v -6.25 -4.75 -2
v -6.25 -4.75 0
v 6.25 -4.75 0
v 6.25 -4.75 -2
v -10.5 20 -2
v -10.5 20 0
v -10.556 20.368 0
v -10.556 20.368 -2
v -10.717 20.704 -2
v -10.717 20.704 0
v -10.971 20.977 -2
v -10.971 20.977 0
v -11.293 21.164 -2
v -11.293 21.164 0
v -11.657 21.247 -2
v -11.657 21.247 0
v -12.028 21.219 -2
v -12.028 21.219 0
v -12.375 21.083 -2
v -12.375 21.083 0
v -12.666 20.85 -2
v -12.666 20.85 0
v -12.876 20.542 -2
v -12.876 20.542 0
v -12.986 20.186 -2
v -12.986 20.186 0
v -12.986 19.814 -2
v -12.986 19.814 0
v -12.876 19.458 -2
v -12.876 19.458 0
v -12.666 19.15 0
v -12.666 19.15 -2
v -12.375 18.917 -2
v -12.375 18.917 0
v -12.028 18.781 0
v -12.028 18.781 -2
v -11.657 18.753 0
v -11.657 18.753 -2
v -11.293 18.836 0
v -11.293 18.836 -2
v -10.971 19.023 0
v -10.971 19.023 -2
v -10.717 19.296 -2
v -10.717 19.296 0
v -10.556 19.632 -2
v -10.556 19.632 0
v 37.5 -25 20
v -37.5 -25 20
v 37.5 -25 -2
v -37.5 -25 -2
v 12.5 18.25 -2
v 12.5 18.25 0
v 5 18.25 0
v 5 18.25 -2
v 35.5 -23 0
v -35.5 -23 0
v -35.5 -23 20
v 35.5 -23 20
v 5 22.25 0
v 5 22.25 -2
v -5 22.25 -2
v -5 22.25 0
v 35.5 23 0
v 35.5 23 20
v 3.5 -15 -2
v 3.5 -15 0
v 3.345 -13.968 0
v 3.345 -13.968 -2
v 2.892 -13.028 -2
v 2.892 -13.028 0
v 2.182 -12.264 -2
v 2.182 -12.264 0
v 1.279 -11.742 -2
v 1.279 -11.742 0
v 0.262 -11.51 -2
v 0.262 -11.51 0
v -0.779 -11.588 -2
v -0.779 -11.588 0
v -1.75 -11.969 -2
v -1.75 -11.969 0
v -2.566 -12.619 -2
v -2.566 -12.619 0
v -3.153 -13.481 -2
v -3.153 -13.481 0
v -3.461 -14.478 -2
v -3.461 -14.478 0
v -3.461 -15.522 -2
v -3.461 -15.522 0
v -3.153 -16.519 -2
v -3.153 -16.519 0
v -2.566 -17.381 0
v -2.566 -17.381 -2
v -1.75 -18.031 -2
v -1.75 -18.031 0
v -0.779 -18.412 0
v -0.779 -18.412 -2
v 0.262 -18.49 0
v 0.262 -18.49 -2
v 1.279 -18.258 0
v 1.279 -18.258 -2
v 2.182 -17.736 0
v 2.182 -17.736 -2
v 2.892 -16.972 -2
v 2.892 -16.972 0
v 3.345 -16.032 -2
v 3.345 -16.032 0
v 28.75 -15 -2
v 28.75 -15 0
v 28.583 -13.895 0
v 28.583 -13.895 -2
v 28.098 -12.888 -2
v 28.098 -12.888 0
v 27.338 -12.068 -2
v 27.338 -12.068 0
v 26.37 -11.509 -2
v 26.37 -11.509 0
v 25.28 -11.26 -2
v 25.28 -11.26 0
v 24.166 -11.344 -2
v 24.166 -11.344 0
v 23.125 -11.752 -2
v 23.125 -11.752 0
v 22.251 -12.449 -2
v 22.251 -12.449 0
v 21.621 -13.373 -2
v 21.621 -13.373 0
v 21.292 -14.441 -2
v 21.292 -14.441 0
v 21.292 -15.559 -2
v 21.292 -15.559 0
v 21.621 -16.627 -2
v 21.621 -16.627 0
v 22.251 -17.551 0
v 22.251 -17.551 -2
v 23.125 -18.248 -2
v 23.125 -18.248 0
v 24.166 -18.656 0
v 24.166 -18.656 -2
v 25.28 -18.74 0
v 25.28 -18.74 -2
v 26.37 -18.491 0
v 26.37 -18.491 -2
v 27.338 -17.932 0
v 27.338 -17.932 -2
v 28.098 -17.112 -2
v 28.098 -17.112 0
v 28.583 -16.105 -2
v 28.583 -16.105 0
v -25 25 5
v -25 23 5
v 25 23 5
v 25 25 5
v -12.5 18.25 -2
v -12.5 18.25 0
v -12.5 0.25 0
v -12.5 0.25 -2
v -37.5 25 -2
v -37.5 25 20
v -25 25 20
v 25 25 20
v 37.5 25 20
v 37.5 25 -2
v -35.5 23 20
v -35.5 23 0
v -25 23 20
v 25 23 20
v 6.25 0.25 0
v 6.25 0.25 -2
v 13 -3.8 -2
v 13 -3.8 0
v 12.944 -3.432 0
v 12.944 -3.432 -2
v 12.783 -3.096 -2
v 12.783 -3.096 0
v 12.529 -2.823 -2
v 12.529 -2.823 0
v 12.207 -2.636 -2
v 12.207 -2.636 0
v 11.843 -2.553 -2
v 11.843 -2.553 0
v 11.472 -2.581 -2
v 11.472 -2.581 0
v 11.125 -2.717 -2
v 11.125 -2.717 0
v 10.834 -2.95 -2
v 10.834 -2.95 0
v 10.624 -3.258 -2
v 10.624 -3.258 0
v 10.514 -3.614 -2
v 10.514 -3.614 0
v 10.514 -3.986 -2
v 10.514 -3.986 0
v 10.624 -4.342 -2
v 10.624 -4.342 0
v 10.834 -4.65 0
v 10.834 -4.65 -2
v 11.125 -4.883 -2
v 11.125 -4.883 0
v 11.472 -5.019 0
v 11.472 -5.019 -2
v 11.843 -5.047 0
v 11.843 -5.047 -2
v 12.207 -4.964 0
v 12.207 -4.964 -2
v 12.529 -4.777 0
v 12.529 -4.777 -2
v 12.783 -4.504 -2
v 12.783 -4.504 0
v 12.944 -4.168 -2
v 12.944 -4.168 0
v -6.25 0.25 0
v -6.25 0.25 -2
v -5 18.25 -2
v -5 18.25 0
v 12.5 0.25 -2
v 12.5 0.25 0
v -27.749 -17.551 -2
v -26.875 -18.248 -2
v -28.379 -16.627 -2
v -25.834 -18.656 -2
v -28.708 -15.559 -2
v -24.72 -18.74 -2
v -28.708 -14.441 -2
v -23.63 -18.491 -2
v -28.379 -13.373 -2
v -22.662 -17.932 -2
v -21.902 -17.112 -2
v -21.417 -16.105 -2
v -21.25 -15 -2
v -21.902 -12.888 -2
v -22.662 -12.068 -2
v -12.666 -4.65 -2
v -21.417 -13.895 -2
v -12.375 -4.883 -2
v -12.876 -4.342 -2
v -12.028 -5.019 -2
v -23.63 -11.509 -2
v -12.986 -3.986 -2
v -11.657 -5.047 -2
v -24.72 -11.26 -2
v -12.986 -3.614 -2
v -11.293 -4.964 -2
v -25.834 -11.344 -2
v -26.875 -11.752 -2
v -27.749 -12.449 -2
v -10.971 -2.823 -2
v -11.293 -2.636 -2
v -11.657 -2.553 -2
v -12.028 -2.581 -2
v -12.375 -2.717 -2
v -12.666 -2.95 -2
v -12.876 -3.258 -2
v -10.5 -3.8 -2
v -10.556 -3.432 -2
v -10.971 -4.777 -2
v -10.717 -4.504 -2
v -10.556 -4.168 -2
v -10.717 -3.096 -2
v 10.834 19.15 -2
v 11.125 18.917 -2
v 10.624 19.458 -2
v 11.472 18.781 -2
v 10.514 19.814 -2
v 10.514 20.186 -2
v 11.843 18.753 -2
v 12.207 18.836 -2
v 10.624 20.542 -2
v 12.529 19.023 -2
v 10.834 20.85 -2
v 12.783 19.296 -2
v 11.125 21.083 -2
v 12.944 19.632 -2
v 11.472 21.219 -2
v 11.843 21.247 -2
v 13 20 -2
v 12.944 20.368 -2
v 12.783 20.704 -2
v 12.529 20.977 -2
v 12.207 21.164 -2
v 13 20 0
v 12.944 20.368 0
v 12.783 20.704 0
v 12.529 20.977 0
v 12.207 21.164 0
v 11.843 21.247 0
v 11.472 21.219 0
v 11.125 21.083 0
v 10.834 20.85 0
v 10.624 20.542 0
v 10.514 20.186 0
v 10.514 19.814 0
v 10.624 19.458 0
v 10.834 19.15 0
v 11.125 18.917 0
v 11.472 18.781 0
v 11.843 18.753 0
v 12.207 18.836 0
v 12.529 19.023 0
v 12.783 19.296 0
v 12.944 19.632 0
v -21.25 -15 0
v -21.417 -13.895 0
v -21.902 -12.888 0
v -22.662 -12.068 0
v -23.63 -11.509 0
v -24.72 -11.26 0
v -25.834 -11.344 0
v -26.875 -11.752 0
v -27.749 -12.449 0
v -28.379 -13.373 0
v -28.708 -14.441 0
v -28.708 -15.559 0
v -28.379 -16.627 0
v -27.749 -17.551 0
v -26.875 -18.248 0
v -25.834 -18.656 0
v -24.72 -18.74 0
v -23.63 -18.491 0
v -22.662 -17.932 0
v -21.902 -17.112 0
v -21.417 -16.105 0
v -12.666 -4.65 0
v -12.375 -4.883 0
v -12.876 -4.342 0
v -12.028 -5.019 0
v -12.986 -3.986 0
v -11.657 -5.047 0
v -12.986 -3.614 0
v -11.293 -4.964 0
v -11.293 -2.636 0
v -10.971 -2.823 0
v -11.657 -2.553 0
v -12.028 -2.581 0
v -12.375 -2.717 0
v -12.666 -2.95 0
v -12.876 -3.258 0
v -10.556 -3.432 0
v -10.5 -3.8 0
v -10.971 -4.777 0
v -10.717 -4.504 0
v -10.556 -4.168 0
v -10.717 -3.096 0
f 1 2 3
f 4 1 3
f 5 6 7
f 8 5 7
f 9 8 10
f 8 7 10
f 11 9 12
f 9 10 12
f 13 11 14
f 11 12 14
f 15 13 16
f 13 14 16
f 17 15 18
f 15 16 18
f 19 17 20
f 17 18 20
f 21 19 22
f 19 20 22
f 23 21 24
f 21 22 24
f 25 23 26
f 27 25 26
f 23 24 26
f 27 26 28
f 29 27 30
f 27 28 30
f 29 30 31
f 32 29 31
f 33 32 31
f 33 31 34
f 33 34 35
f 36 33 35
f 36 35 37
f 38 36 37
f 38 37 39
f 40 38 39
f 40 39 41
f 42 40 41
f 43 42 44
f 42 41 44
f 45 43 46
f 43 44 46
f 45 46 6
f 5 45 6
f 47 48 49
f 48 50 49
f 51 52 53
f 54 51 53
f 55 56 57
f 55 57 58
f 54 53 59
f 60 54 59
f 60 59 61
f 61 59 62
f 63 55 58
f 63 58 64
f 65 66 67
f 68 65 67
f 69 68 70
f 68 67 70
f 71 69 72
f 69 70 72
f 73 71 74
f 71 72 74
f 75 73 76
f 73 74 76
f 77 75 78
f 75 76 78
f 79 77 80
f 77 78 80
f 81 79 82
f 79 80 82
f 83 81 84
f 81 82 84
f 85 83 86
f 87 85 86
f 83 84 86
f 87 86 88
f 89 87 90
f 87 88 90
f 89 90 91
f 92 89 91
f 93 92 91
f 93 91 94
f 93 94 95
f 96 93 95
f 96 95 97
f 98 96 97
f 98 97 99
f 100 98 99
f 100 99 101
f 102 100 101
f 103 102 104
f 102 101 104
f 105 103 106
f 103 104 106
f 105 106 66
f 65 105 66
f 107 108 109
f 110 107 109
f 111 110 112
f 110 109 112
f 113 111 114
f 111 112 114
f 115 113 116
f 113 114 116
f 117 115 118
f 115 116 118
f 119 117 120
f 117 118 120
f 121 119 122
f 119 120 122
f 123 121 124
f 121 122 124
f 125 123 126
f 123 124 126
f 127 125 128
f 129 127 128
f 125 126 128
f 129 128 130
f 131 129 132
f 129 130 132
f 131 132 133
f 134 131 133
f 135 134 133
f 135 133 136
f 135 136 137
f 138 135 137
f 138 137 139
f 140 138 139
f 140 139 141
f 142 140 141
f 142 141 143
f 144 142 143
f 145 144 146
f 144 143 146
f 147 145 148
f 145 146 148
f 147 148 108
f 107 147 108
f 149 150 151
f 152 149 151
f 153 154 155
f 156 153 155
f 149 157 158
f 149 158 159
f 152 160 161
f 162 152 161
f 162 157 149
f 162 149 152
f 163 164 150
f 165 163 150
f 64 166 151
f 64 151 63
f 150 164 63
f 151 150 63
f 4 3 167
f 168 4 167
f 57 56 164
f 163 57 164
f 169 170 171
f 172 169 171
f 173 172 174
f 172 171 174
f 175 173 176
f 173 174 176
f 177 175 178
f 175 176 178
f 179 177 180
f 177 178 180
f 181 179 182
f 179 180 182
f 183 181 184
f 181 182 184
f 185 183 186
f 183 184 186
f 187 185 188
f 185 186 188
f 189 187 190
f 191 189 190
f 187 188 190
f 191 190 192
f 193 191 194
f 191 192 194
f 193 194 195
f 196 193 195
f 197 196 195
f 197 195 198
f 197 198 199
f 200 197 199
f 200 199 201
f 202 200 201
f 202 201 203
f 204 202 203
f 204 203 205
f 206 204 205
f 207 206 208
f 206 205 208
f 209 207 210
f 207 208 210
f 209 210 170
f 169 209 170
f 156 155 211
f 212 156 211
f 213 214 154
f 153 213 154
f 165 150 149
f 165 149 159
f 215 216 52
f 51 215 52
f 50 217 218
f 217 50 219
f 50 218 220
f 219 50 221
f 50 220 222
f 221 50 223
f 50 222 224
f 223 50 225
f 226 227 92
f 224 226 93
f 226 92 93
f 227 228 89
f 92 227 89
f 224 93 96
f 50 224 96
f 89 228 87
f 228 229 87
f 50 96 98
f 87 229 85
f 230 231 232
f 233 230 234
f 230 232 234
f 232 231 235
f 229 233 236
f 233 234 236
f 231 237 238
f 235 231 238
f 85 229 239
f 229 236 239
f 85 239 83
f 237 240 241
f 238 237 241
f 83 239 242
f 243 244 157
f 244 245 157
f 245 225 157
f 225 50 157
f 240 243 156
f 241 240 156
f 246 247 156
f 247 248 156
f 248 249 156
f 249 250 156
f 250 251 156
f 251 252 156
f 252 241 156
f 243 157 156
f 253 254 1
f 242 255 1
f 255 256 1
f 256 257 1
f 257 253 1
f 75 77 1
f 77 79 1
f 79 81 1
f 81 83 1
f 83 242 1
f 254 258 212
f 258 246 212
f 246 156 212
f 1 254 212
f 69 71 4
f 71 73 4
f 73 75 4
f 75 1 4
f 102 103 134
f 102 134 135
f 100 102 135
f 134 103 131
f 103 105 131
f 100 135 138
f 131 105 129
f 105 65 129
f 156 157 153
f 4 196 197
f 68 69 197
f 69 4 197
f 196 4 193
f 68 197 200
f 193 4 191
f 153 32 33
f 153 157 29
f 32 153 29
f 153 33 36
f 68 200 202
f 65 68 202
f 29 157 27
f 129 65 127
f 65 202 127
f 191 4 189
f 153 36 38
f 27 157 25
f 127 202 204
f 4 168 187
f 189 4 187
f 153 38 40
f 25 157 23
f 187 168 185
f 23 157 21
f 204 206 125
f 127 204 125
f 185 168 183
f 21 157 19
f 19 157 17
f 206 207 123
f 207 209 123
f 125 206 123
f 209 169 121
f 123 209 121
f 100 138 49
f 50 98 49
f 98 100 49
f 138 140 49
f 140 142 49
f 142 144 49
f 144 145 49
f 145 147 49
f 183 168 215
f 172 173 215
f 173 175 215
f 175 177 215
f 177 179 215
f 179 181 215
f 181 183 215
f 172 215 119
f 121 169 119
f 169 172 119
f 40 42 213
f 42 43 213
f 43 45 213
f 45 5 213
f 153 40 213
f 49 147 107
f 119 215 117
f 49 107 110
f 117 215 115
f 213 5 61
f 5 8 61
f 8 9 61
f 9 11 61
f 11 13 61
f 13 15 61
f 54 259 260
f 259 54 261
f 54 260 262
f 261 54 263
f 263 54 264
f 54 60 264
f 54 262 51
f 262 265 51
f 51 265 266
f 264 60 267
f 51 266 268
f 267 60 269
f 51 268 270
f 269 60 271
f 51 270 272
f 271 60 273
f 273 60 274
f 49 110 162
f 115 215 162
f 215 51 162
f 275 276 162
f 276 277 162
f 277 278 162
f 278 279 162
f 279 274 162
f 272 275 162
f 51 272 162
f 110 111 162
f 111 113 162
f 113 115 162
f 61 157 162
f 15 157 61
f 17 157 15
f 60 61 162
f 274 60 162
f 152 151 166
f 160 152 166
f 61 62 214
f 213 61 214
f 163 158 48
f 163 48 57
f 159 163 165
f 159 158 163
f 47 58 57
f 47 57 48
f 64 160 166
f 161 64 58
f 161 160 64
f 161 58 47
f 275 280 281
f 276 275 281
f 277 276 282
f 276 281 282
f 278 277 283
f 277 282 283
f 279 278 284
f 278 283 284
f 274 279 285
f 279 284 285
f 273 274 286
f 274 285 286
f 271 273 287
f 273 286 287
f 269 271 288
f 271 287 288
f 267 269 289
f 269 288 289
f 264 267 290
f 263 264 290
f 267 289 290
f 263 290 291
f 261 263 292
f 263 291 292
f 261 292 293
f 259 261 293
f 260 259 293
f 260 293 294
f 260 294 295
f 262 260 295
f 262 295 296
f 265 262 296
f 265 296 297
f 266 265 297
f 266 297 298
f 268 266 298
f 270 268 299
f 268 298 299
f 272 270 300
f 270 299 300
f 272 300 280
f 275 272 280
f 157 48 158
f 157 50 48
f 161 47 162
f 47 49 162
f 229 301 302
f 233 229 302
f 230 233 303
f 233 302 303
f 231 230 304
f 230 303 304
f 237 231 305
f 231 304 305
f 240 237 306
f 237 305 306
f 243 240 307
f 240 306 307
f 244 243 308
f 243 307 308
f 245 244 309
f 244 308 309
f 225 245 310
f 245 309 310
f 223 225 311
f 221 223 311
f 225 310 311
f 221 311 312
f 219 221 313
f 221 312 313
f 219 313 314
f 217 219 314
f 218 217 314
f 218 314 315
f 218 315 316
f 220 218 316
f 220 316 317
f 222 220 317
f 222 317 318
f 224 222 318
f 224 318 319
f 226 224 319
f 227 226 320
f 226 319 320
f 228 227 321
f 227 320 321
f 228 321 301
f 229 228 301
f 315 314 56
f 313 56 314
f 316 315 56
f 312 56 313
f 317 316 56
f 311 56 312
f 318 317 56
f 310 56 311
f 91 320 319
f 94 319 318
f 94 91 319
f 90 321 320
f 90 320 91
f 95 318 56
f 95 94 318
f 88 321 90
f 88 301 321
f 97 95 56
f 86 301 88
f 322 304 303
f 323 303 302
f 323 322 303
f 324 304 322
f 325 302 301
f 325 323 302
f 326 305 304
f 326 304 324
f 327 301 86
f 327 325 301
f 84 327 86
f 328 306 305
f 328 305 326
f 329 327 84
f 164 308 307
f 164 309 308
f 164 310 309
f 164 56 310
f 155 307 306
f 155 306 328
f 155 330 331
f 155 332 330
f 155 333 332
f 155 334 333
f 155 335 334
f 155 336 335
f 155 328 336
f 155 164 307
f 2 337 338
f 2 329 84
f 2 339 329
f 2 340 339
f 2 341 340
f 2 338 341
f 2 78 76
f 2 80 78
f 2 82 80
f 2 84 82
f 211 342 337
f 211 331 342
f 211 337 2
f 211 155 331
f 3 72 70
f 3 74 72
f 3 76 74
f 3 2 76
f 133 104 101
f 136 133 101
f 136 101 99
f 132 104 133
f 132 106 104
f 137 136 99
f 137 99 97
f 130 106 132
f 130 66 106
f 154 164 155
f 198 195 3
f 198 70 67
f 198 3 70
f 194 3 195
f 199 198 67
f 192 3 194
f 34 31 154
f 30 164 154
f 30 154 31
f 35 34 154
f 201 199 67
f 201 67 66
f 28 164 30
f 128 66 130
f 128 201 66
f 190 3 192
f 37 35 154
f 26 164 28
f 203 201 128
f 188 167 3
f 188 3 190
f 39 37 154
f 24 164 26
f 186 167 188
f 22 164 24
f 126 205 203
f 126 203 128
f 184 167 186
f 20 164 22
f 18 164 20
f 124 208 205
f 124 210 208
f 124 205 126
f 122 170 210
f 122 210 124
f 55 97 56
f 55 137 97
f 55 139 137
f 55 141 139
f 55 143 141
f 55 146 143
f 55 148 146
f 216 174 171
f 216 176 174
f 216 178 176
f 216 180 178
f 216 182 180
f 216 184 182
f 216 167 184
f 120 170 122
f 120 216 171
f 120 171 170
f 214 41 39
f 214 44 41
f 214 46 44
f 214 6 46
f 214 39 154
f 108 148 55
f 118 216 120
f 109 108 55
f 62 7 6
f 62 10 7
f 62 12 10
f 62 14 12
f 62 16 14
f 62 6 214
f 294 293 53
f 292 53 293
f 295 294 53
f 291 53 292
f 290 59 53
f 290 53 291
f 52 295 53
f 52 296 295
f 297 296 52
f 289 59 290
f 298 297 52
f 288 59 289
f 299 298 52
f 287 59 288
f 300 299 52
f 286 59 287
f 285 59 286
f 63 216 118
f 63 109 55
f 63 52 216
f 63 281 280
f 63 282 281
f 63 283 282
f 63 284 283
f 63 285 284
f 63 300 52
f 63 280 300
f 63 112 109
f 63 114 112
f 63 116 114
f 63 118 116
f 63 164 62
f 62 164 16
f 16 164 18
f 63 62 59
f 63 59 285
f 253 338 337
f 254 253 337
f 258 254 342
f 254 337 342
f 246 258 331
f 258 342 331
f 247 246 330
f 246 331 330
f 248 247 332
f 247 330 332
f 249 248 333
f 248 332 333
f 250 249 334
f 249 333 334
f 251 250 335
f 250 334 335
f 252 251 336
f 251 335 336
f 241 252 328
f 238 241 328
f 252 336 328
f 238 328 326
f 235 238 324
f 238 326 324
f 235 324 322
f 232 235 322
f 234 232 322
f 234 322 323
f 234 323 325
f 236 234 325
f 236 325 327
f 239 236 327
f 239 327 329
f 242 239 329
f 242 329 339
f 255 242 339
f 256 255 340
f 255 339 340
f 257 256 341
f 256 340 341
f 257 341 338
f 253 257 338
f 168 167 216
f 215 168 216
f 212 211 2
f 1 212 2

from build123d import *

# Parameters (mm, degrees)
SKETCH_W      = 75
SKETCH_H      = 50
SKETCH_R      = 3.5
SKETCH_R_2    = 3.75
SKETCH_R_3    = 1.25
PAD_DEPTH     = 2
SKETCH001_W   = 75
SKETCH001_H   = 50
SKETCH001_W_2 = 71
SKETCH001_H_2 = 46
PAD001_DEPTH  = 20
SKETCH002_W   = 50
SKETCH002_H   = 15
POCKET_DEPTH  = 25.001


with BuildPart() as part:
    # Sketch → Pad (new body)
    with BuildSketch(Plane.XY):
        Rectangle(SKETCH_W, SKETCH_H)
        with Locations((0, -15)):
            Circle(SKETCH_R, mode=Mode.SUBTRACT)
        with Locations((25, -15)):
            Circle(SKETCH_R_2, mode=Mode.SUBTRACT)
        with Locations((-25, -15)):
            Circle(SKETCH_R_2, mode=Mode.SUBTRACT)
        with Locations((-11.75, 20)):
            Circle(SKETCH_R_3, mode=Mode.SUBTRACT)
        with Locations((-11.75, -3.8)):
            Circle(SKETCH_R_3, mode=Mode.SUBTRACT)
        with Locations((11.75, -3.8)):
            Circle(SKETCH_R_3, mode=Mode.SUBTRACT)
        with Locations((11.75, 20)):
            Circle(SKETCH_R_3, mode=Mode.SUBTRACT)
        Polygon((-12.5, 18.25), (-12.5, 0.25), (-6.25, 0.25), (-6.25, -4.75), (6.25, -4.75), (6.25, 0.25), (12.5, 0.25), (12.5, 18.25), (5, 18.25), (5, 22.25), (-5, 22.25), (-5, 18.25), align=None, mode=Mode.SUBTRACT)
    extrude(amount=-PAD_DEPTH)

    # Sketch001 → Pad001 (join)
    with BuildSketch(Plane.XY):
        Rectangle(SKETCH001_W, SKETCH001_H)
        Rectangle(SKETCH001_W_2, SKETCH001_H_2, mode=Mode.SUBTRACT)
    extrude(amount=PAD001_DEPTH)

    # Sketch002 → Pocket (cut, through all)
    with BuildSketch(Plane.XZ):
        with Locations((0, 12.5)):
            Rectangle(SKETCH002_W, SKETCH002_H)
    extrude(amount=-POCKET_DEPTH, mode=Mode.SUBTRACT)


solid = part.part
